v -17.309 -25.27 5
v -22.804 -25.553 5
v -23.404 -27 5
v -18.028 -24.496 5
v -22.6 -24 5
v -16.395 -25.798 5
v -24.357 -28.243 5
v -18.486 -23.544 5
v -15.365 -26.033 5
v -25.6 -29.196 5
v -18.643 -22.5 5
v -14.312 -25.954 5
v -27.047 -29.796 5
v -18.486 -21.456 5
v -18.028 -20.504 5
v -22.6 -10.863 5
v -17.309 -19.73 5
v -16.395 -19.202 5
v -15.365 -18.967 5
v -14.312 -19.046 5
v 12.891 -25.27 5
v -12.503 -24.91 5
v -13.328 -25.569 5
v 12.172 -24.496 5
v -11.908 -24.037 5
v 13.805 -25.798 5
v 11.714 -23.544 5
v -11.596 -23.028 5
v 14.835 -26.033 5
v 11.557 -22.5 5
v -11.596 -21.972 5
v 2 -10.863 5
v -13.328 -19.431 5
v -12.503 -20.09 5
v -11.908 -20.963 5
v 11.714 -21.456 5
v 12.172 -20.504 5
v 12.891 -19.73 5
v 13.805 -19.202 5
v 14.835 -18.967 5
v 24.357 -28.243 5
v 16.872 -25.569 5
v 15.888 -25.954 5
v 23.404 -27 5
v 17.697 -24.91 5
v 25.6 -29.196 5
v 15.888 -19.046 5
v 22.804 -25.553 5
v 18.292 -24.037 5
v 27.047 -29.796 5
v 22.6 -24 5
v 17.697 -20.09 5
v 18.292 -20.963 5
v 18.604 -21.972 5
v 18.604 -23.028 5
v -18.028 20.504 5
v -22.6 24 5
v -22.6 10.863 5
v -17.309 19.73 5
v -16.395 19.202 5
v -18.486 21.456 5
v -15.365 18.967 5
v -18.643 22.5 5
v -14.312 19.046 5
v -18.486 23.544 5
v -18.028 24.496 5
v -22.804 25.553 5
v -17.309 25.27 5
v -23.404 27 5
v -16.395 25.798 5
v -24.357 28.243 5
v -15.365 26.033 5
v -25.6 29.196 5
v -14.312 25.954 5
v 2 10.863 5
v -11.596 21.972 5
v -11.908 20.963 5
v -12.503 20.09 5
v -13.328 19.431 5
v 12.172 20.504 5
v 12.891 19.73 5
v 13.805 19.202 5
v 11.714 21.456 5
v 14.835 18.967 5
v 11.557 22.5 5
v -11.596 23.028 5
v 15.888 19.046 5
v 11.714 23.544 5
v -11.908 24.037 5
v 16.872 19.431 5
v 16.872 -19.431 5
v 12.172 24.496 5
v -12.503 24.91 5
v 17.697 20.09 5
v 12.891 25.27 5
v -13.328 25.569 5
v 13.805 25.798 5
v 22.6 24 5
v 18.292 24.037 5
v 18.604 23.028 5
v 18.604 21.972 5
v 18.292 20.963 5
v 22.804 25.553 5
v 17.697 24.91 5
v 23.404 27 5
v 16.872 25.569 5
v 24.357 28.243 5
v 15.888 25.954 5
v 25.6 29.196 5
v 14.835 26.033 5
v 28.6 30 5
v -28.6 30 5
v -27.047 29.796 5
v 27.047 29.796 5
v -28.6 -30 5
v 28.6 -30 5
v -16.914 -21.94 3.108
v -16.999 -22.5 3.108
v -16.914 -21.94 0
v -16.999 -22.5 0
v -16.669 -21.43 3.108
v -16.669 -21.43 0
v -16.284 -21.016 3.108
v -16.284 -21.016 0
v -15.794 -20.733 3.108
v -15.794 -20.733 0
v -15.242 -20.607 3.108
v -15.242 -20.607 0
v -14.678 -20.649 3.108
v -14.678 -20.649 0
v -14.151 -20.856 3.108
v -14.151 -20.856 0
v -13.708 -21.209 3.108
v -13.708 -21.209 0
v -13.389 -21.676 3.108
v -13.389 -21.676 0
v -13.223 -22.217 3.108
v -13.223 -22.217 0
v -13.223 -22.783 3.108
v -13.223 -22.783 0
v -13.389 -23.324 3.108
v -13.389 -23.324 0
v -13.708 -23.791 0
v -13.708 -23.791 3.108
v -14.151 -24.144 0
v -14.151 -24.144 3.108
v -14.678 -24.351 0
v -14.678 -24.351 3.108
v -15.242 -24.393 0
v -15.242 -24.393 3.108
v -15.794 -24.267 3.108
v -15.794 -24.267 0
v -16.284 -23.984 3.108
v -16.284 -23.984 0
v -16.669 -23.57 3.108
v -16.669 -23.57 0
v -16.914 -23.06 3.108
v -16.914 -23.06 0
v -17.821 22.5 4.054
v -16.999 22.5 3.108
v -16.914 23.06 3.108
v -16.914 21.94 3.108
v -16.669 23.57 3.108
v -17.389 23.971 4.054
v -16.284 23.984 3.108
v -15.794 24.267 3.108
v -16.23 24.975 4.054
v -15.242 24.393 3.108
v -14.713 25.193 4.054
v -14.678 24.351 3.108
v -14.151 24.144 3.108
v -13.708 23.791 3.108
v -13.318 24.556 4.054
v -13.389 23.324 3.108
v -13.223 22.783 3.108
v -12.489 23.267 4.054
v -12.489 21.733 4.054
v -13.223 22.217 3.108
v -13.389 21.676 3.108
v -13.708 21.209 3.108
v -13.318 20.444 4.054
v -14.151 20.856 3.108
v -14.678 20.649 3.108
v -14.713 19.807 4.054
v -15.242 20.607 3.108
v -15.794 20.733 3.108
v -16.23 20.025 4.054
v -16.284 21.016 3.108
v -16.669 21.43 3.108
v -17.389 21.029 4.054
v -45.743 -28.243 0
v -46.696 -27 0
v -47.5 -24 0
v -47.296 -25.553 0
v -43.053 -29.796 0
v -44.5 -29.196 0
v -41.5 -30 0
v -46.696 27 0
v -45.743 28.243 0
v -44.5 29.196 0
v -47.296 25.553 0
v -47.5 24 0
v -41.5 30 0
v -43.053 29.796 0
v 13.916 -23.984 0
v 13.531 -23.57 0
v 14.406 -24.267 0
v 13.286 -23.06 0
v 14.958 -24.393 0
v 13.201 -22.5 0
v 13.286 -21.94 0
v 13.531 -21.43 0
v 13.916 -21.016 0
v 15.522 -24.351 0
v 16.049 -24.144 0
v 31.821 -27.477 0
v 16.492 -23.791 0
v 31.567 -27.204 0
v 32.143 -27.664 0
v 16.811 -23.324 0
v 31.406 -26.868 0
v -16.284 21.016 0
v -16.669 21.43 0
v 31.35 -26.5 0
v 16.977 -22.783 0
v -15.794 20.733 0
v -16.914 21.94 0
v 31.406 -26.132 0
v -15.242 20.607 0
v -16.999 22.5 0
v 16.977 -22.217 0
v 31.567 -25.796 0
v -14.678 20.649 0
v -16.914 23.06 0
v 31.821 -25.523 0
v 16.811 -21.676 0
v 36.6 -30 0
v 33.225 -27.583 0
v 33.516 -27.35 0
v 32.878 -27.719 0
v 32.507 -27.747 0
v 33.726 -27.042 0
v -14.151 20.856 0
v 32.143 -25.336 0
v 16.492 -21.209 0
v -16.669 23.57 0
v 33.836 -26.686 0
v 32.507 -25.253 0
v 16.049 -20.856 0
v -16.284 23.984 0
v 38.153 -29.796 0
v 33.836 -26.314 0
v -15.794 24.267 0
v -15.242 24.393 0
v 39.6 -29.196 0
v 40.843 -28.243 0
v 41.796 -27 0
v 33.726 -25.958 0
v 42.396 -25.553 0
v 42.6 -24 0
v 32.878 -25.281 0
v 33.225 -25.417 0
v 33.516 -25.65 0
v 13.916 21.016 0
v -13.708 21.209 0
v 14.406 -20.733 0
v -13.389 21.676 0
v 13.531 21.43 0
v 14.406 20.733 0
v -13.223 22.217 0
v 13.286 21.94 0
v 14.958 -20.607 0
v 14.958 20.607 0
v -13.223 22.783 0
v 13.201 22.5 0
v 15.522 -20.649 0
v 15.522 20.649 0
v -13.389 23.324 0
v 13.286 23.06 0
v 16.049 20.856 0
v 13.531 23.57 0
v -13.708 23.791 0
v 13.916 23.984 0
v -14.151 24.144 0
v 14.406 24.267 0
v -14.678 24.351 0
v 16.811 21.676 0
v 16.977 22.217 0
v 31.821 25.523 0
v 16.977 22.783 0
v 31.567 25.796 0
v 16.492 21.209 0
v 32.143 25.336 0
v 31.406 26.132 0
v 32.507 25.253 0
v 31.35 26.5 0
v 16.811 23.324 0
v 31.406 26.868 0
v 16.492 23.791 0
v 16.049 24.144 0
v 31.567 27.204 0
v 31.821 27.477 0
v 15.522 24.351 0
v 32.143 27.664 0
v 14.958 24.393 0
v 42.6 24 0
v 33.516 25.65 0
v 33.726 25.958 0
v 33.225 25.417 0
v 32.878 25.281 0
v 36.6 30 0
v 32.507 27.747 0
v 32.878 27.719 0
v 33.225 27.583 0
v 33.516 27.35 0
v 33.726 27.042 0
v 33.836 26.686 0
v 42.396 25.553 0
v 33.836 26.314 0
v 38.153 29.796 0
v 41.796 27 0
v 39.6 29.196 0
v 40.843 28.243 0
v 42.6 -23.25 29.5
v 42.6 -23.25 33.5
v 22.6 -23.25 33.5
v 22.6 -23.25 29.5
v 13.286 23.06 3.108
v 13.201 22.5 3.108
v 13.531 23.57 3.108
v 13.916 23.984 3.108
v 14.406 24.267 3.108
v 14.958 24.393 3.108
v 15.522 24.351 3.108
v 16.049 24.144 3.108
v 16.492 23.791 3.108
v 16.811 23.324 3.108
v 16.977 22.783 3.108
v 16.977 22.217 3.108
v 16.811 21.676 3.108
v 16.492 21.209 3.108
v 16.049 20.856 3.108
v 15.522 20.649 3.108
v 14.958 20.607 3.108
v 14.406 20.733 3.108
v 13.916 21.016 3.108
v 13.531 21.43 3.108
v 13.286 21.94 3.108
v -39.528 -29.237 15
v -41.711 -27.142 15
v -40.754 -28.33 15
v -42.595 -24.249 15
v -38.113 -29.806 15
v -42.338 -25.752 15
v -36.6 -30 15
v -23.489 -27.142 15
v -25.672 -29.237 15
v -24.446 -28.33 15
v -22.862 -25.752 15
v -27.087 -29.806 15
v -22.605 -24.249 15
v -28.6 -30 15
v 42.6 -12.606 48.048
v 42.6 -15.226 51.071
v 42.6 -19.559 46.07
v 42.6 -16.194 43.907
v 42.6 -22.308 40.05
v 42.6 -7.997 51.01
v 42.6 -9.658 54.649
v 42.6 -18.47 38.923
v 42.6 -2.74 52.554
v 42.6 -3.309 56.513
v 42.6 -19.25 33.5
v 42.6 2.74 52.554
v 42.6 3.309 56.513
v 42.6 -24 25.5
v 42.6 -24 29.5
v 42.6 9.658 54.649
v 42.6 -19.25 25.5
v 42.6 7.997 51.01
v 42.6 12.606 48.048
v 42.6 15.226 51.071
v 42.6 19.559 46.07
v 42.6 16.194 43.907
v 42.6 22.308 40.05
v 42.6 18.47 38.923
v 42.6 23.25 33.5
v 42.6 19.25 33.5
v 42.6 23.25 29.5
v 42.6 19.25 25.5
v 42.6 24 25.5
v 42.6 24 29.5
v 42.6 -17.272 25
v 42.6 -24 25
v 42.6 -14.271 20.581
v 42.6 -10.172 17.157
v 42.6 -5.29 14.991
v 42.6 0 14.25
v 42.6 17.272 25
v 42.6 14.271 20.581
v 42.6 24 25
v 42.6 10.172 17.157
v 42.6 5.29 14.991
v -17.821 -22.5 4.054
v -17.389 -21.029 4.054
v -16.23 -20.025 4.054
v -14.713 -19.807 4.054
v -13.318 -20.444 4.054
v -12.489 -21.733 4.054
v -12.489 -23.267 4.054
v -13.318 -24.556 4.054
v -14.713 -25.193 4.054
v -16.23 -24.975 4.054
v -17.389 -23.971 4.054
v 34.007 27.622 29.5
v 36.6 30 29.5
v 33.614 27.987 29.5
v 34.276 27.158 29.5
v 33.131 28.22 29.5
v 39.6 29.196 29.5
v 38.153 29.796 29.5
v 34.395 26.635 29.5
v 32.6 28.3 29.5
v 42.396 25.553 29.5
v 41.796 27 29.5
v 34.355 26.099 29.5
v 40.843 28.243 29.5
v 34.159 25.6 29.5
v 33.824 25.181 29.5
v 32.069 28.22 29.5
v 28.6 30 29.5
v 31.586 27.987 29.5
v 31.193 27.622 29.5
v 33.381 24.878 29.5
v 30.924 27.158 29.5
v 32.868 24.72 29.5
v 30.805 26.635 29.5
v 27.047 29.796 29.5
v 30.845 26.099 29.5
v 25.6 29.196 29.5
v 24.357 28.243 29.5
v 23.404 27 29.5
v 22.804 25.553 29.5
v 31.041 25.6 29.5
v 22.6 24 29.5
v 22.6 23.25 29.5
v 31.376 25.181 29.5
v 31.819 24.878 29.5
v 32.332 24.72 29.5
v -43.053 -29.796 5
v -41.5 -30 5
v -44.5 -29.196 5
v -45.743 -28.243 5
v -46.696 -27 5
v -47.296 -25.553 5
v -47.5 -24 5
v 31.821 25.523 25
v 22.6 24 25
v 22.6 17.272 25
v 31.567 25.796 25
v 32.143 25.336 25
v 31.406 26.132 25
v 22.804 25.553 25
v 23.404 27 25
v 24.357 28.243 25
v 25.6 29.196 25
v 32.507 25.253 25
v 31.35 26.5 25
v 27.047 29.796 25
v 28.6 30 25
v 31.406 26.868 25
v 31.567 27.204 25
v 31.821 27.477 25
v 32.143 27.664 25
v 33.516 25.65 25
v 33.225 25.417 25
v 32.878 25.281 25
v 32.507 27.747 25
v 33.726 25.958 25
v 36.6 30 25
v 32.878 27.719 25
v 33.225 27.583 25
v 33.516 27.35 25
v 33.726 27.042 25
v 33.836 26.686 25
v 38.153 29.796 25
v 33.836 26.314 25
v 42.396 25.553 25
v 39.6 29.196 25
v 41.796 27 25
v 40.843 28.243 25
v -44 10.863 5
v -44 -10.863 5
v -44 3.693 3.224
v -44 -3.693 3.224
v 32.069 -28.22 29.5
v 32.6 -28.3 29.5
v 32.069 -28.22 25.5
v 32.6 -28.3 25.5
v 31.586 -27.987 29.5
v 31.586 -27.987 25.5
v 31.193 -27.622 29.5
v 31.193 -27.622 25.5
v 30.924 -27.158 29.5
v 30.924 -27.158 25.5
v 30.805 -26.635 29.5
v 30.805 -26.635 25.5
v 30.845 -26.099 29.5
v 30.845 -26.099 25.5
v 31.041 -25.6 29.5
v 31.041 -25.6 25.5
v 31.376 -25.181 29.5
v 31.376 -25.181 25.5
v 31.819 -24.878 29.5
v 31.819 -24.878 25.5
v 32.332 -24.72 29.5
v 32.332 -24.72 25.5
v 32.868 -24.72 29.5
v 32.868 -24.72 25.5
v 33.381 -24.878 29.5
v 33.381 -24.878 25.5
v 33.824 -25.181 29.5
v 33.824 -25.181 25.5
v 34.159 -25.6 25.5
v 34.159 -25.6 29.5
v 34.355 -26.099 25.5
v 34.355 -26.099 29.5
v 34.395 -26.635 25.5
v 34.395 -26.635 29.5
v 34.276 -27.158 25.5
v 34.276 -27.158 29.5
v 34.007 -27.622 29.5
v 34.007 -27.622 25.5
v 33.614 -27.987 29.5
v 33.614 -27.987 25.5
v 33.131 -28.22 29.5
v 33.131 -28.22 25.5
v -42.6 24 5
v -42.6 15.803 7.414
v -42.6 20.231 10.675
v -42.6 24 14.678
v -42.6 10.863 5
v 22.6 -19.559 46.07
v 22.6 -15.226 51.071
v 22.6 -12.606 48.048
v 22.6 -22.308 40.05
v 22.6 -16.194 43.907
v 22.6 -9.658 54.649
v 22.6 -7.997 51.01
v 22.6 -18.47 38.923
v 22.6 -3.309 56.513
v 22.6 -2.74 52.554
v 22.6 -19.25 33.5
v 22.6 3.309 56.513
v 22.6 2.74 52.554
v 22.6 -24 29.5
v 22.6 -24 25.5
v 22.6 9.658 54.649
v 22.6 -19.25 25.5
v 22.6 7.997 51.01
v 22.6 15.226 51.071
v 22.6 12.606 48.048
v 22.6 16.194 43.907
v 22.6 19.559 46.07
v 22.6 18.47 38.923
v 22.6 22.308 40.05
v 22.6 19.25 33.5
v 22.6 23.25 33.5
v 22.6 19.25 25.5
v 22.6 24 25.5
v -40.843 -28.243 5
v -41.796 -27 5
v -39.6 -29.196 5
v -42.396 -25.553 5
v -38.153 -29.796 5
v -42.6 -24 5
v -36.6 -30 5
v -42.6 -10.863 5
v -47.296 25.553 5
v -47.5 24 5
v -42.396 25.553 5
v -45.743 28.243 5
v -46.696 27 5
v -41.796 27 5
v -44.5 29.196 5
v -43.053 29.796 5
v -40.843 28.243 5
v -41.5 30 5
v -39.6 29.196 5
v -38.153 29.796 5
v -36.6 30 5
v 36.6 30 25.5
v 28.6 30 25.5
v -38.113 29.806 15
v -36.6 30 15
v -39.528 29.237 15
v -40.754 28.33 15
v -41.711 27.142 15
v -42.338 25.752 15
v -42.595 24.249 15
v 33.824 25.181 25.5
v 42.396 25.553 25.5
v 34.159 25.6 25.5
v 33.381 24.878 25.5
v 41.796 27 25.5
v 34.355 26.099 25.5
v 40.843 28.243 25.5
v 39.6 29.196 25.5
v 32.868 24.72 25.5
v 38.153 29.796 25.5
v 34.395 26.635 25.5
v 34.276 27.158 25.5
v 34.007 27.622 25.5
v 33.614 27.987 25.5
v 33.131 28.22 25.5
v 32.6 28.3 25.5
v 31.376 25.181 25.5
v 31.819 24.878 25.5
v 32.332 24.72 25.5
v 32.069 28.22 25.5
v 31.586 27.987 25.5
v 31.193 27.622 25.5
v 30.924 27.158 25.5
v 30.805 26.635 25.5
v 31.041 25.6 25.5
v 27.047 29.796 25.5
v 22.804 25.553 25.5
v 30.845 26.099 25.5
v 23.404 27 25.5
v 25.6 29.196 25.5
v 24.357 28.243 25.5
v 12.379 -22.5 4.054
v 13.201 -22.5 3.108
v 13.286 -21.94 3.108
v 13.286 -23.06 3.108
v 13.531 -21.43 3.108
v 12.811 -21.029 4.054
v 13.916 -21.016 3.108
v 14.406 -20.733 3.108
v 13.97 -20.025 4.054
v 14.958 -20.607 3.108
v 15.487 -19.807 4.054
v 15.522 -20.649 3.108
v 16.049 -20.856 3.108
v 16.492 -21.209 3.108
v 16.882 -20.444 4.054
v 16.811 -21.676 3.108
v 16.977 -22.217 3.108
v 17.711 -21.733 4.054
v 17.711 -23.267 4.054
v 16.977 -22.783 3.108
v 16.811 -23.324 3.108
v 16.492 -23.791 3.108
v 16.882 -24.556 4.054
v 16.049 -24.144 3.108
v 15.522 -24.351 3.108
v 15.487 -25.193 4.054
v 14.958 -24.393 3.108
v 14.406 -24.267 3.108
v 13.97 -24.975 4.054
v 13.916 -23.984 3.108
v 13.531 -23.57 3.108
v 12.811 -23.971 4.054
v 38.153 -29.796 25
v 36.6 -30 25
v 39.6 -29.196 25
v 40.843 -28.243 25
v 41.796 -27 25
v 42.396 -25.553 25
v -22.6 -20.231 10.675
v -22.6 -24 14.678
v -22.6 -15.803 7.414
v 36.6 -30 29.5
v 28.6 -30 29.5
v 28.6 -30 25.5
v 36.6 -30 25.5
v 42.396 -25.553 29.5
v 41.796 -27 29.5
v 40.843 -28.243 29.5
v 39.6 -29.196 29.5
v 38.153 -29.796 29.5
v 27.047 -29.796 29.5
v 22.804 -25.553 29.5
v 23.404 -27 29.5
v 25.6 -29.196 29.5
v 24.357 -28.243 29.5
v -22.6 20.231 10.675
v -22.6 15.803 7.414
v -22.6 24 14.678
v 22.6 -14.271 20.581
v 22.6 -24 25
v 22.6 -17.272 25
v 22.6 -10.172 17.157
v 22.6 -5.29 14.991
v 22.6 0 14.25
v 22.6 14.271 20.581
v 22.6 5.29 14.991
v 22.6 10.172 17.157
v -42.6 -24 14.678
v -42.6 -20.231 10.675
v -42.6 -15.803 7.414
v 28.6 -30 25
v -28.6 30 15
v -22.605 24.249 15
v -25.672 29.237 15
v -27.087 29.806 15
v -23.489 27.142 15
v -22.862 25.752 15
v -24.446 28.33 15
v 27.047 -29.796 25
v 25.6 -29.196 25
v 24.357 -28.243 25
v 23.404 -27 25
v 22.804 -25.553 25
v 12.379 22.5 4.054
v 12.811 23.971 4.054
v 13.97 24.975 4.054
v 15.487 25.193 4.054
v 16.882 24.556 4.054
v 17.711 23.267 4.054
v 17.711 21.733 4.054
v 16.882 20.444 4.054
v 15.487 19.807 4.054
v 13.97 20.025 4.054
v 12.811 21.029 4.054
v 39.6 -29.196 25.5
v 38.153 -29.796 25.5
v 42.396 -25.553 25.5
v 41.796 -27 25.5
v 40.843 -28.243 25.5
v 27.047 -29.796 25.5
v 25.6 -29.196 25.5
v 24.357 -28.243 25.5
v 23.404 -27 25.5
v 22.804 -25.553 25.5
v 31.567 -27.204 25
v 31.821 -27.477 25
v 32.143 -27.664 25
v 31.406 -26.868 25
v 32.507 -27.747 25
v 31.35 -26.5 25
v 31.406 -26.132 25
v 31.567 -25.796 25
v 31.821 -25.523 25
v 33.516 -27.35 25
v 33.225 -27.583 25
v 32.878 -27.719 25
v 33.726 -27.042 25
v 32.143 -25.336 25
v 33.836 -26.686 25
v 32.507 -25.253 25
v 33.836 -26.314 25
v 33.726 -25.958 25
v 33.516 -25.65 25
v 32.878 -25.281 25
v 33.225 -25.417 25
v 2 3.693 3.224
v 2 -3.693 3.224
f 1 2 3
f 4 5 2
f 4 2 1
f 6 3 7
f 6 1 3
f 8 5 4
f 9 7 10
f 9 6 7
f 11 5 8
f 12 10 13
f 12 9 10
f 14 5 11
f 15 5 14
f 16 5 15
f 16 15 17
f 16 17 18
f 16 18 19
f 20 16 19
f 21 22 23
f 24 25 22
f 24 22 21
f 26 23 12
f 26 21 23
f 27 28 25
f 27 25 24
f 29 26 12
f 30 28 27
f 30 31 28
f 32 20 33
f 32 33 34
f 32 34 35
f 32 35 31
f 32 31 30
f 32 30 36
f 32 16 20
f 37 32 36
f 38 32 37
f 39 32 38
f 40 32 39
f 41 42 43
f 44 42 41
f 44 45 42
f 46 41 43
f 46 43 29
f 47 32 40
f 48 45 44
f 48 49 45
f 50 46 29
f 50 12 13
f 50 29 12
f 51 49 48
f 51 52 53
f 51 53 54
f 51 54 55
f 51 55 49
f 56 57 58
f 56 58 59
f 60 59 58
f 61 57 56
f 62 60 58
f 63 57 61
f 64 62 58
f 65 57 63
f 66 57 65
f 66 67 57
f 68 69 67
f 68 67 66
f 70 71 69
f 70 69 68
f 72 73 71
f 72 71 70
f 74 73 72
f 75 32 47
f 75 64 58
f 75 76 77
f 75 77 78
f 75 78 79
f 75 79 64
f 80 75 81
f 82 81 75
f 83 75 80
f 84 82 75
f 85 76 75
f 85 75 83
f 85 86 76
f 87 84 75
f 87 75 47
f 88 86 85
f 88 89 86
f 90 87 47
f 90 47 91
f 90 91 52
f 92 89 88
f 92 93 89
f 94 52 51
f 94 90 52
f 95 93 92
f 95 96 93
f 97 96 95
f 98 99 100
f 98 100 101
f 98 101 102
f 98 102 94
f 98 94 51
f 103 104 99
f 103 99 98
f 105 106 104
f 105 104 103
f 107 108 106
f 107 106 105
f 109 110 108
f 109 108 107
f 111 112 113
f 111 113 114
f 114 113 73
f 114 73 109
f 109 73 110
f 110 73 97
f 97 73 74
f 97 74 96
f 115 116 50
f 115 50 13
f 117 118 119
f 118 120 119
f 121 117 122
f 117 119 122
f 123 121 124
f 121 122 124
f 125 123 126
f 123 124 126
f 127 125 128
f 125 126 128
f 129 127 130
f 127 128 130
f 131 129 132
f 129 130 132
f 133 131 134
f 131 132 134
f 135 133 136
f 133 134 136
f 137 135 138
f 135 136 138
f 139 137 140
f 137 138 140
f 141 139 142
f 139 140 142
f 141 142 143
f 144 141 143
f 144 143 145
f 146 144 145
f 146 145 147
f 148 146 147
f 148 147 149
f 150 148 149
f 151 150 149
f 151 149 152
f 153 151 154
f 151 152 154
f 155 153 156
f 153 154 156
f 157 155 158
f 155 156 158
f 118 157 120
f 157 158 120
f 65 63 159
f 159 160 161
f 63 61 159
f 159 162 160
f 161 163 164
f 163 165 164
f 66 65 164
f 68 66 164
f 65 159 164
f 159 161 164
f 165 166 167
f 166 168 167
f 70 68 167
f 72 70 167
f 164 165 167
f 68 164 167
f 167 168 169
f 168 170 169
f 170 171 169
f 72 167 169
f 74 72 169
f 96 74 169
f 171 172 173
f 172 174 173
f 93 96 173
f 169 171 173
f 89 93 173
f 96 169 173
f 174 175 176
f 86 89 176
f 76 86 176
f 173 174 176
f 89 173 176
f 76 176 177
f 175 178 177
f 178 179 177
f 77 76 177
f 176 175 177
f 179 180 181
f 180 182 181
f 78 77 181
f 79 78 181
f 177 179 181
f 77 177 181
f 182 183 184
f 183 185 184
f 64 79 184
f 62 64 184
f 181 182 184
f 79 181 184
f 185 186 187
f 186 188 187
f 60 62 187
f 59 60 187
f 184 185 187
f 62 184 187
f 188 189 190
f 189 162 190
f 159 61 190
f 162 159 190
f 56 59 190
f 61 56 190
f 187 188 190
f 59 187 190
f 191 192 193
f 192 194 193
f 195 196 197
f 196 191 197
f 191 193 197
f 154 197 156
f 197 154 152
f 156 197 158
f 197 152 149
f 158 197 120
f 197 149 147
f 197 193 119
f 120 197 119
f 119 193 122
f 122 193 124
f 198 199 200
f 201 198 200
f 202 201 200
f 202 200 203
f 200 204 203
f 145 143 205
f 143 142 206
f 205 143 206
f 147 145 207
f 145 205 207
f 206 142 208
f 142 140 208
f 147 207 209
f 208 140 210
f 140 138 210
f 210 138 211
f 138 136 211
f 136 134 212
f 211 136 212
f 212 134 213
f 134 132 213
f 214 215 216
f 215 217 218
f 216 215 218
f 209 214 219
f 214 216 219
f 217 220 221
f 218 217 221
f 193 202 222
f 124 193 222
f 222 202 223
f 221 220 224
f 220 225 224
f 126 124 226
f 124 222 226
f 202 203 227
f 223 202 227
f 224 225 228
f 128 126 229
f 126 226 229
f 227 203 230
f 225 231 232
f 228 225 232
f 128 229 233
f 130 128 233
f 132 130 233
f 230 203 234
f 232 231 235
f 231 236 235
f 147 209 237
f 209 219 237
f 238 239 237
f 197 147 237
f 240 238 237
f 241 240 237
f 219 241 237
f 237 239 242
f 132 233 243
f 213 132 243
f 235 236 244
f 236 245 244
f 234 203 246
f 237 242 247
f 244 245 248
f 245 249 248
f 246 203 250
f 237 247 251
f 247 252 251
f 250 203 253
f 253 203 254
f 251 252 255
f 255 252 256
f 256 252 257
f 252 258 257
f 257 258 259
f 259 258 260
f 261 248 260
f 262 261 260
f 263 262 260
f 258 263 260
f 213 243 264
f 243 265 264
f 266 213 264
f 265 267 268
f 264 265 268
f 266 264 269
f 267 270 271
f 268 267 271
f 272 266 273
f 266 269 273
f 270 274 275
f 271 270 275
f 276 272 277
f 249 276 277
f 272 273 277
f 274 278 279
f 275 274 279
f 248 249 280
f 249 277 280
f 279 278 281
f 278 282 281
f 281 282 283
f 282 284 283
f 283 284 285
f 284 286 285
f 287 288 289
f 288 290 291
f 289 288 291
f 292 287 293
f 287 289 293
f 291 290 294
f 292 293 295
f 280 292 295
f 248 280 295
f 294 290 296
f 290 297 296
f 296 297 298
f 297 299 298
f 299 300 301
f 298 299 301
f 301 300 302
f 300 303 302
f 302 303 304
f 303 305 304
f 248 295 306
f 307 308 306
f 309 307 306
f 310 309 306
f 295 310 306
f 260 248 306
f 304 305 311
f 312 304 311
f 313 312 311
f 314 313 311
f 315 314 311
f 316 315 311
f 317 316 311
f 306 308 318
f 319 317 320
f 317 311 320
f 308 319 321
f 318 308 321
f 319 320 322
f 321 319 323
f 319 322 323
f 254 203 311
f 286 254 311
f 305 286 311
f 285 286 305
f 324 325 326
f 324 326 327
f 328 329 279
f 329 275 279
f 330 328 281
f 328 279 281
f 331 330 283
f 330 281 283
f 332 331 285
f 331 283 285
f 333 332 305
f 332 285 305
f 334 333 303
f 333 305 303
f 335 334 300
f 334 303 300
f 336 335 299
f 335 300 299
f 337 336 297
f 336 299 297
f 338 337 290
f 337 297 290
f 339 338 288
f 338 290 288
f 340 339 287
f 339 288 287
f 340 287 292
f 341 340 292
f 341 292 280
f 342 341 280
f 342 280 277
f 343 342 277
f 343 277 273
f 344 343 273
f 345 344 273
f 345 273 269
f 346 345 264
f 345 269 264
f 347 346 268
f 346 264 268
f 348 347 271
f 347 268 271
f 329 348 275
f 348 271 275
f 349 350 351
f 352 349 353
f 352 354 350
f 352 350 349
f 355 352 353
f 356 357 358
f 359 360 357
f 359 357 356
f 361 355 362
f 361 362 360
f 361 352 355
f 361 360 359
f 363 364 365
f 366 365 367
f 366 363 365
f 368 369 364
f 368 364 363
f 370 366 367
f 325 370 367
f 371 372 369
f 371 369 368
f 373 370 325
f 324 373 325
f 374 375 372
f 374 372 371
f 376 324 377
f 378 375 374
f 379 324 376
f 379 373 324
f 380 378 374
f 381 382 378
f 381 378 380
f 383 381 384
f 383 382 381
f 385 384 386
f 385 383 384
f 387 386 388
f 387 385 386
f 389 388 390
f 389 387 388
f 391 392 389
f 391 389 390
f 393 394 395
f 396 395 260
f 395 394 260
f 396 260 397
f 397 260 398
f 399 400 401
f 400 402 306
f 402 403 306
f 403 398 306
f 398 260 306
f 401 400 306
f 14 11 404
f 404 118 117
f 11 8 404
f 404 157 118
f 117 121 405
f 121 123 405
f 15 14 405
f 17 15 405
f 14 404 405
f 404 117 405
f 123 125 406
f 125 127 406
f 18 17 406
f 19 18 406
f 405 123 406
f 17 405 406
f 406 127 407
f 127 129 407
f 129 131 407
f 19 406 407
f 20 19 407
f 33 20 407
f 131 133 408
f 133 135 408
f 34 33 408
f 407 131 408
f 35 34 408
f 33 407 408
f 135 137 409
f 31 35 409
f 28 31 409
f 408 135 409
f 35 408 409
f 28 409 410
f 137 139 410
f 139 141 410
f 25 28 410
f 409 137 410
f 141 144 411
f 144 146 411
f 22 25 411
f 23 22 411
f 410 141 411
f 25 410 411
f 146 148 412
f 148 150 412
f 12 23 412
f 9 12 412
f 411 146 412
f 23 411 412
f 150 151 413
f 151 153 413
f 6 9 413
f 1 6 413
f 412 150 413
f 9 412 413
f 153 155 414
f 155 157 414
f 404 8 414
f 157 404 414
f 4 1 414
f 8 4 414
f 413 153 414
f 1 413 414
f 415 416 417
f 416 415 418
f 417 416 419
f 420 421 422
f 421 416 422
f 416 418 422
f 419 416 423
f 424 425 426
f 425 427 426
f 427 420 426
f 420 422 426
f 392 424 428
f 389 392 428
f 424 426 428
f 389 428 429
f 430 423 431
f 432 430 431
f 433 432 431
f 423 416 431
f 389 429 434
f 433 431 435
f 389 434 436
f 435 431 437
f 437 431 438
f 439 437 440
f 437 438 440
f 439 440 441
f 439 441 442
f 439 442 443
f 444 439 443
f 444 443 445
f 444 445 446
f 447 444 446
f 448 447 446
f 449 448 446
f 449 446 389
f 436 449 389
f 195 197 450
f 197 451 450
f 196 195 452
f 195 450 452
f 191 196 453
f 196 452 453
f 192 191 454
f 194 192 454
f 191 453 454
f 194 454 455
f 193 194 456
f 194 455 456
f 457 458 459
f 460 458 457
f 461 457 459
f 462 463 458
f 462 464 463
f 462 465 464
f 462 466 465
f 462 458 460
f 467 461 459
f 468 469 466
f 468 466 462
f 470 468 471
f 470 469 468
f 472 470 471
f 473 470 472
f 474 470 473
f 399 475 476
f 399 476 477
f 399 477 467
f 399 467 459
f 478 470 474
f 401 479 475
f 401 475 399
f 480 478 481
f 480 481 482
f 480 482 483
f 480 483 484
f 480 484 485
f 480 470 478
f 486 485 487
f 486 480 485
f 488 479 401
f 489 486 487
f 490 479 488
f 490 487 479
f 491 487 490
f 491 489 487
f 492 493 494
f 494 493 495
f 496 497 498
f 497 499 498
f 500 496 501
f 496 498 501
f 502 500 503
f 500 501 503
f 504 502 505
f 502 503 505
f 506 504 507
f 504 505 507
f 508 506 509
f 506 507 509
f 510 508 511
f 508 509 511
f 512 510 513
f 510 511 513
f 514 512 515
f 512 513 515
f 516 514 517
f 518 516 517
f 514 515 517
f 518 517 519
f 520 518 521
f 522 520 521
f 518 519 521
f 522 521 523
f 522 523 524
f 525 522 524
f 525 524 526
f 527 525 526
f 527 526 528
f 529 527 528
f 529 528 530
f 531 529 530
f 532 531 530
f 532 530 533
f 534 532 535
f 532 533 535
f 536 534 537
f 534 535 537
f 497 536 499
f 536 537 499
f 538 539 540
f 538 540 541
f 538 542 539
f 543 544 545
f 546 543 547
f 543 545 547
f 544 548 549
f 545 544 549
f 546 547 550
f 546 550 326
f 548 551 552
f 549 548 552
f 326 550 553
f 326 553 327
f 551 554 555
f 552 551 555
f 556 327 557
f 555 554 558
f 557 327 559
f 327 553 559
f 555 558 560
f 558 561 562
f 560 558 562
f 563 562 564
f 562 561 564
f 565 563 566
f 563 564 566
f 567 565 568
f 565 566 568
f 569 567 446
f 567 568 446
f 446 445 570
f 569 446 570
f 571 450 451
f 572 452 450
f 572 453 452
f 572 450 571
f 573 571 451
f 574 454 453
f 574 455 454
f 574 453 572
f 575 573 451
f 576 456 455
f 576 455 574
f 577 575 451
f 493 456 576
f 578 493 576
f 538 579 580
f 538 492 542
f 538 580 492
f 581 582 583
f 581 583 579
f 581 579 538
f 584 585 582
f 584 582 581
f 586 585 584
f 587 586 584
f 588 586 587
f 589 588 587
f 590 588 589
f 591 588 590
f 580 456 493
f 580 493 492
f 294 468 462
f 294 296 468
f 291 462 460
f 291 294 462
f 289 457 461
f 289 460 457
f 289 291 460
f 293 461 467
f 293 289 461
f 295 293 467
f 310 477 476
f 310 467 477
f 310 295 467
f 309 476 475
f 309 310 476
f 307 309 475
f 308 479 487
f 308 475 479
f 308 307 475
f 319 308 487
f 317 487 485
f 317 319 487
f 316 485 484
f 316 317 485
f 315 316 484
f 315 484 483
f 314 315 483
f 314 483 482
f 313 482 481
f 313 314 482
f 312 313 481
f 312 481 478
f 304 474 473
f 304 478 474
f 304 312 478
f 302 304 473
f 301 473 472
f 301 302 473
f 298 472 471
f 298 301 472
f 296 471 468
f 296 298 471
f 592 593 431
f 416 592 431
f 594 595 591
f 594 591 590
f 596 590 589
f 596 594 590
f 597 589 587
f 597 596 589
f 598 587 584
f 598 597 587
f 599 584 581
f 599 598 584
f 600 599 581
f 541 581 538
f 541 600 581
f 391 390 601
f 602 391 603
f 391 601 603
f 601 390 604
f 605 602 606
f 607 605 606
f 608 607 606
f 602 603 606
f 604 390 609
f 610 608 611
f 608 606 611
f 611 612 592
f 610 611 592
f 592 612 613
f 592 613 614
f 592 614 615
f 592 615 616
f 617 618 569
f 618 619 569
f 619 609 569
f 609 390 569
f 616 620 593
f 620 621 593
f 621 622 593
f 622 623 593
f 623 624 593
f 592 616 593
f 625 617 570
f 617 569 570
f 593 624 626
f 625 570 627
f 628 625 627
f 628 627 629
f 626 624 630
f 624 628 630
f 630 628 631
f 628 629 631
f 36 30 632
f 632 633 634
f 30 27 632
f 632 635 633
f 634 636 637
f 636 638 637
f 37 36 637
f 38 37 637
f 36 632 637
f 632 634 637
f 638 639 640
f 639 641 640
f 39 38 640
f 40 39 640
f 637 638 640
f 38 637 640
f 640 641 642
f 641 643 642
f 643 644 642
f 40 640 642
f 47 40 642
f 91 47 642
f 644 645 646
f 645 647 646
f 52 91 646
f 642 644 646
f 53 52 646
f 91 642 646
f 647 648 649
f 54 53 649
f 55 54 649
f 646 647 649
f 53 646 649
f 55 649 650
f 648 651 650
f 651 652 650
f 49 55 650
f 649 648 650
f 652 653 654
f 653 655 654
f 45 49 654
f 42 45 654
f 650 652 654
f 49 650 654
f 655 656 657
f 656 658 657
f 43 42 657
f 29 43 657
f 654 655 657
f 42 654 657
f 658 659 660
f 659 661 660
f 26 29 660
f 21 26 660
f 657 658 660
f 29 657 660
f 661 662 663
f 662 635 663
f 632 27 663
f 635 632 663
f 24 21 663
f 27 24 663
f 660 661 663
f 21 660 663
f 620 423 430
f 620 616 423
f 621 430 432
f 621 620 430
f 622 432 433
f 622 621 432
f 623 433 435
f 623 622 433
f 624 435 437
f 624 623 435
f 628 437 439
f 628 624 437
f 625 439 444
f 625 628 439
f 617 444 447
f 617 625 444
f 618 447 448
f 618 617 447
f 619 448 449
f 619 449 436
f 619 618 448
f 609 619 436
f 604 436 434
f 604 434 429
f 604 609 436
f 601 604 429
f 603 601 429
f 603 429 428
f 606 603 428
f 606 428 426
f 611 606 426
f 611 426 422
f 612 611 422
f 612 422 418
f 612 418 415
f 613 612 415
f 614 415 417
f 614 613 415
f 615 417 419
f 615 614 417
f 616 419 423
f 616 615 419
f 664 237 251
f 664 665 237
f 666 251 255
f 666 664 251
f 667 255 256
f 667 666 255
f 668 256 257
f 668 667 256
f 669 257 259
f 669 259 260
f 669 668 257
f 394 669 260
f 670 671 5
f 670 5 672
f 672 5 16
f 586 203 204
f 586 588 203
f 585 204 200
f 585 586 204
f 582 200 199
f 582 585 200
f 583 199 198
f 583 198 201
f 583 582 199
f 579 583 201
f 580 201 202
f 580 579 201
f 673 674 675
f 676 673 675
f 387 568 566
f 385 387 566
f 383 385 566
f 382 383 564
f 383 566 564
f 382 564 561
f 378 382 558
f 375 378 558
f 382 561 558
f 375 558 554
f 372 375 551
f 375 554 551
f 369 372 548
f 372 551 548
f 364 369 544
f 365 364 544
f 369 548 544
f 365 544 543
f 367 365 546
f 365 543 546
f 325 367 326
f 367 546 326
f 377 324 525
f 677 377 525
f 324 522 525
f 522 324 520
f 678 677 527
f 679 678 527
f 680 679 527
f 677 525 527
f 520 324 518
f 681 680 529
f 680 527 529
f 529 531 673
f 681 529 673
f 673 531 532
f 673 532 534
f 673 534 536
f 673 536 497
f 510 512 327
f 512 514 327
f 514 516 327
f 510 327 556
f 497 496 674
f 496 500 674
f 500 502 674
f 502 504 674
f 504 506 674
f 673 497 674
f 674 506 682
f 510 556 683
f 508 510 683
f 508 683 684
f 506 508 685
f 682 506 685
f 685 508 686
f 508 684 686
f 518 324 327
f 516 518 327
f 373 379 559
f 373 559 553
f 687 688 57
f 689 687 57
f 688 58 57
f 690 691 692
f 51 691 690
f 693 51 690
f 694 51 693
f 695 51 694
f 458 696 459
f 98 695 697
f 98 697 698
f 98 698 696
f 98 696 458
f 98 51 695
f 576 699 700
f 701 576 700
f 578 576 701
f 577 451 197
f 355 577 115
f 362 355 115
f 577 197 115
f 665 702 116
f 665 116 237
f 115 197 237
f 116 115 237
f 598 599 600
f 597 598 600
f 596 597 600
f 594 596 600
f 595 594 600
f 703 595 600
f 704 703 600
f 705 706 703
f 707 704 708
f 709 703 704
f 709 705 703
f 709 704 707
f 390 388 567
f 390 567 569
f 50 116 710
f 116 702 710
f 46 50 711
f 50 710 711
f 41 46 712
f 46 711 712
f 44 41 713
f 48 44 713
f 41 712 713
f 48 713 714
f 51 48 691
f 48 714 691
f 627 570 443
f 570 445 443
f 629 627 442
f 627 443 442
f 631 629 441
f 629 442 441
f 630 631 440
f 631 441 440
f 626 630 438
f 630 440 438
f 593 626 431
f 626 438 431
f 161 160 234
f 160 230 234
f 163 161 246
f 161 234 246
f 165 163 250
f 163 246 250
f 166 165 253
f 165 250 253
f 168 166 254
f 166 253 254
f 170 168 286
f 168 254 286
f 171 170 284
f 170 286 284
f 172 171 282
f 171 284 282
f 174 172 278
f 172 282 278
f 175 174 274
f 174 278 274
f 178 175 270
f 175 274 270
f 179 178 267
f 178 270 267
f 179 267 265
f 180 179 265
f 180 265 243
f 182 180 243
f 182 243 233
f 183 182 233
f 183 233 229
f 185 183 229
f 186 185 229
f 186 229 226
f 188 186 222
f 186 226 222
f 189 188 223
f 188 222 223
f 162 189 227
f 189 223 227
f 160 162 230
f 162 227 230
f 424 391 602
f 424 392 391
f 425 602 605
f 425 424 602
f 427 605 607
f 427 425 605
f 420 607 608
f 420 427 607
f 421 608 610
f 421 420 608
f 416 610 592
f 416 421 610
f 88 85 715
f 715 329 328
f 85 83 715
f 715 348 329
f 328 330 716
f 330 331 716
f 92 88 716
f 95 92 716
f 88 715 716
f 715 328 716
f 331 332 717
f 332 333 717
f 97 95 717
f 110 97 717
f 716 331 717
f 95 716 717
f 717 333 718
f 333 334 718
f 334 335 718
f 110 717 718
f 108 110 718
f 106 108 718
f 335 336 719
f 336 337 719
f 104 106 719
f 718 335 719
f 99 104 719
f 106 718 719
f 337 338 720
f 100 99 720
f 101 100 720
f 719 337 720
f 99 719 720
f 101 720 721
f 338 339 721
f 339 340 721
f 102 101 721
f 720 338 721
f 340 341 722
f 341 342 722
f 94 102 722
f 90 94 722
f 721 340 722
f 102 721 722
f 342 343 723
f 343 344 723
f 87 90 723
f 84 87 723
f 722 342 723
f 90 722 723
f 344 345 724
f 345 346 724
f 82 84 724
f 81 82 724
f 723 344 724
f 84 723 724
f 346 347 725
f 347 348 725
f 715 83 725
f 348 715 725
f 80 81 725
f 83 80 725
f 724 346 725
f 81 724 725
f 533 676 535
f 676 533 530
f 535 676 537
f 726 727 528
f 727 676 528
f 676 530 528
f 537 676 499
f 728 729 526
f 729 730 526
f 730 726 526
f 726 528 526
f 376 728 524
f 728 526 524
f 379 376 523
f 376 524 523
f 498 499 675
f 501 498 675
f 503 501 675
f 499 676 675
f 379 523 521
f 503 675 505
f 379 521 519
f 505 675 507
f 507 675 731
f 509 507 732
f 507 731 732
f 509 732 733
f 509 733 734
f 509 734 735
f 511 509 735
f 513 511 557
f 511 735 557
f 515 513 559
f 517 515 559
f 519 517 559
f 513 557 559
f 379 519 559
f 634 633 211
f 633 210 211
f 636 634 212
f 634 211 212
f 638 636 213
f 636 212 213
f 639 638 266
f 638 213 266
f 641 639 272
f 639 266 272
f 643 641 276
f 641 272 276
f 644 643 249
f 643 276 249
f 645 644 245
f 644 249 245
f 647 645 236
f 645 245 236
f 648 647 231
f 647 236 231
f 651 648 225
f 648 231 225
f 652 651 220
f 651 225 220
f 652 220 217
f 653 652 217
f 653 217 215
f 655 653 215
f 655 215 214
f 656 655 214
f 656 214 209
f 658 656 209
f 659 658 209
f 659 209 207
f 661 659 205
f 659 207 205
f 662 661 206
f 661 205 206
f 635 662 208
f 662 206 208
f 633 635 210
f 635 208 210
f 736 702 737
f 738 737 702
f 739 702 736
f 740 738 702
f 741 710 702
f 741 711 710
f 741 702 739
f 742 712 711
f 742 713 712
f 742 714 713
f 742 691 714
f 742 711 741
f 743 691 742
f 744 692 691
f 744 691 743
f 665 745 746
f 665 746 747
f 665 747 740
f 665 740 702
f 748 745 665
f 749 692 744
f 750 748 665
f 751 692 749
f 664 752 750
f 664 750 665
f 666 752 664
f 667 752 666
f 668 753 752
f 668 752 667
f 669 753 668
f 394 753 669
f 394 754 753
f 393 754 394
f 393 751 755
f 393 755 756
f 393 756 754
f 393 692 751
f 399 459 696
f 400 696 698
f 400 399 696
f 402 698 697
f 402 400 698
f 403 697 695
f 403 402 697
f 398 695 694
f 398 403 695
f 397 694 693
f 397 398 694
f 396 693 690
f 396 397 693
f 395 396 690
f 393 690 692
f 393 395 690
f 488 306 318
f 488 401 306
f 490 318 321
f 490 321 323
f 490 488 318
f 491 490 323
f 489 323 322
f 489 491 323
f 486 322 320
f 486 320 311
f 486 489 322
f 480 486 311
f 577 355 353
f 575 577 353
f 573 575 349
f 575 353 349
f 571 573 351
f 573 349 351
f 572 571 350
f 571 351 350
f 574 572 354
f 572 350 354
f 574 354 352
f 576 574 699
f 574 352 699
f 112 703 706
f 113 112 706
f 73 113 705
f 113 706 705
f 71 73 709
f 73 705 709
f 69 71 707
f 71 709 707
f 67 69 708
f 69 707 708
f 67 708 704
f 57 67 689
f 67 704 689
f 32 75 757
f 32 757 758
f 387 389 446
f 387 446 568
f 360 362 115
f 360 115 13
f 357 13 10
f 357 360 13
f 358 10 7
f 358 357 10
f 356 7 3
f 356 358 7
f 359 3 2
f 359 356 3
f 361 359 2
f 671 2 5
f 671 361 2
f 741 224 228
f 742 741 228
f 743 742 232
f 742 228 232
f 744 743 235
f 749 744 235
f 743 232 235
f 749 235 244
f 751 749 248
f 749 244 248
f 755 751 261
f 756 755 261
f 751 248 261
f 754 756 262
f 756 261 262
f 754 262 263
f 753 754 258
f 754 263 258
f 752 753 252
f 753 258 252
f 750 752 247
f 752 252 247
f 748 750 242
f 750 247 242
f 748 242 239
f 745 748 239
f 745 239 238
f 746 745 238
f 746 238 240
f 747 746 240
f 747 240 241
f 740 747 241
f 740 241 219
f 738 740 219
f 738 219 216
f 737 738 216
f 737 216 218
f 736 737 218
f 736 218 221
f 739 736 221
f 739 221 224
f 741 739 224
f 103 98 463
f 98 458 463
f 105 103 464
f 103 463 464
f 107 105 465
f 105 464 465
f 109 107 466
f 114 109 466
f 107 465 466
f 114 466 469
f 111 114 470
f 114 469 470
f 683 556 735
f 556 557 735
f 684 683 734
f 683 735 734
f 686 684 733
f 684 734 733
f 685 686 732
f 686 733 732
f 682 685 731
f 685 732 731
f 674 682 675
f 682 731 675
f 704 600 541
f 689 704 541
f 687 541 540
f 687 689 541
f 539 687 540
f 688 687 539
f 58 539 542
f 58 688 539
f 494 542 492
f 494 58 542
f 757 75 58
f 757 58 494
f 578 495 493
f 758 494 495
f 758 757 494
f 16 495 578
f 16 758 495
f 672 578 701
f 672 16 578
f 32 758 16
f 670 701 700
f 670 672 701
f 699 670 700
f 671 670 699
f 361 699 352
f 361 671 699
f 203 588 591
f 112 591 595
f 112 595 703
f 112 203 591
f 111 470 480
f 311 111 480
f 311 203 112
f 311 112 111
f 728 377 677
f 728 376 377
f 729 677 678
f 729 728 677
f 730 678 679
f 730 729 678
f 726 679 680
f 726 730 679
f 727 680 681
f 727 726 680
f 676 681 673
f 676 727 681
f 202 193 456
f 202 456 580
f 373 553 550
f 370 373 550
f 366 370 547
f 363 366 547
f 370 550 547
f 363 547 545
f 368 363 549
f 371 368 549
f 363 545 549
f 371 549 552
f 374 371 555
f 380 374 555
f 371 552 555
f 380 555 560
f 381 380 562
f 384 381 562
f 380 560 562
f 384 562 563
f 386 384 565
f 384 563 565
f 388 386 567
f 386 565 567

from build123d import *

# Parameters (mm, degrees)
BASE_SKETCH_W                   = 90
BASE_SKETCH_H                   = 60
BASE_EXTRUDE_DEPTH              = 5
CRADLE_SKETCH_W                 = 20
CRADLE_SKETCH_H                 = 60
CRADLE_EXTRUDE_DEPTH            = 25
NO_6_MOUNTING_HOLES_D           = 3.7973
NO_6_MOUNTING_HOLES_CSINK_D     = 7.0866
NO_6_MOUNTING_HOLES_CSINK_ANGLE = 82
MOVE_START                      = 15
MOVE_FACE_OUTLINE_W             = 20
MOVE_FACE_OUTLINE_H             = 60
MOVE_FACE_DEPTH                 = 10
CLAMP_THREADED_HOLE_D           = 2.5
CRADLE_FILLETS_R                = 6
BASE_FILLETS_R                  = 6
MOTOR_START                     = 22.6
MOTOR_CLAMP_EXTRUDE_DEPTH       = 20
SKETCH9_W                       = 1.8
SKETCH9_H                       = 4
CLAMP_CORNER_FILLETS_R          = 6


# Read off the part's stored shape, not the designer's step: Move Face
with BuildPart() as part:
    # Base Sketch → Base Extrude (new body)
    with BuildSketch(Plane.XY):
        with Locations((-2.5, 0)):
            Rectangle(BASE_SKETCH_W, BASE_SKETCH_H)
    extrude(amount=BASE_EXTRUDE_DEPTH)

    # Cradle Sketch → Cradle Extrude (add)
    with BuildSketch(Plane.XY):
        with Locations((-32.6, 0)):
            Rectangle(CRADLE_SKETCH_W, CRADLE_SKETCH_H)
        with Locations((32.6, 0)):
            Rectangle(CRADLE_SKETCH_W, CRADLE_SKETCH_H)
    extrude(amount=CRADLE_EXTRUDE_DEPTH)

    # No. 6 Mounting Holes (through all)
    with Locations(Plane.XY.offset(5)):
        with Locations((-15.1, 22.5), (15.1, 22.5), (-15.1, -22.5), (15.1, -22.5)):
            CounterSinkHole(NO_6_MOUNTING_HOLES_D / 2, NO_6_MOUNTING_HOLES_CSINK_D / 2, counter_sink_angle=NO_6_MOUNTING_HOLES_CSINK_ANGLE)

    # Pump and Motor Revolve Cut Sketch → Pump and Motor Revolve Cut (revolve, cut)
    with BuildSketch(Plane(origin=(0, 0, 0), x_dir=(1, 0, 0), z_dir=(0, 1, 0))):
        Polygon((-44, -33.5), (-44, -3), (2, -3), (2, -14.25), (66, -14.25), (66, -33.5), align=None)
    revolve(axis=Axis((66, 0, 33.5), (-1, 0, 0)), mode=Mode.SUBTRACT)

    # Move Face outline → Move Face (cut)
    with BuildSketch(Plane.XY.offset(MOVE_START)):
        with Locations((-32.6, 0)):
            Rectangle(MOVE_FACE_OUTLINE_W, MOVE_FACE_OUTLINE_H)
    extrude(amount=MOVE_FACE_DEPTH, mode=Mode.SUBTRACT)

    # Clamp Threaded Hole (through all)
    with Locations(Plane.XY.offset(25)):
        with Locations((32.6, -26.5)):
            clamp_threaded_hole = Hole(CLAMP_THREADED_HOLE_D / 2)

    # Cradle Fillets
    cradle_fillets_edges = [part.edges().sort_by_distance(p)[0] for p in [
        (-42.6, 30, 10),
        (42.6, 30, 12.5),
        (42.6, -30, 12.5),
        (-42.6, -30, 10),
        (22.6, 30, 15),
        (22.6, -30, 15),
        (-22.6, 30, 10),
        (-22.6, -30, 10),
    ]]
    fillet(cradle_fillets_edges, radius=CRADLE_FILLETS_R)

    # Base Fillets
    base_fillets_edges = [part.edges().sort_by_distance(p)[0] for p in [
        (-47.5, -30, 2.5),
        (-47.5, 30, 2.5),
    ]]
    fillet(base_fillets_edges, radius=BASE_FILLETS_R)


with BuildPart() as body_2:
    # Hold Down Bracket Sketch → Motor Clamp Extrude (new body)
    with BuildSketch(Plane(origin=(0, 0, 0), x_dir=(0, 0, -1), z_dir=(1, 0, 0)).offset(MOTOR_START)):
        with BuildLine():
            Line((-33.5, -23.25), (-29.5, -23.25))
            Line((-29.5, -23.25), (-29.5, -30))
            Line((-29.5, -30), (-25.5, -30))
            Line((-25.5, -30), (-25.5, -19.25))
            Line((-25.5, -19.25), (-33.5, -19.25))
            ThreePointArc((-33.5, -19.25), (-52.75, 0), (-33.5, 19.25))
            Line((-33.5, 19.25), (-25.5, 19.25))
            Line((-25.5, 19.25), (-25.5, 30))
            Line((-25.5, 30), (-29.5, 30))
            Line((-29.5, 30), (-29.5, 23.25))
            Line((-29.5, 23.25), (-33.5, 23.25))
            ThreePointArc((-33.5, 23.25), (-56.75, 0), (-33.5, -23.25))
        make_face()
    extrude(amount=MOTOR_CLAMP_EXTRUDE_DEPTH)

    # Sketch9 → Clamp Clearance Hole (revolve, cut)
    with BuildSketch(Plane(origin=(32.6, -26.5, 29.5), x_dir=(0, -1, 0), z_dir=(1, 0, 0))):
        with Locations((0.9, 2)):
            Rectangle(SKETCH9_W, SKETCH9_H)
    clamp_clearance_hole = revolve(axis=Axis((32.6, -26.5, 35.85), (0, 0, -1)), mode=Mode.SUBTRACT)


with BuildPart() as motor_clamp_screw_holes_mirror_tool:
    # Motor Clamp Screw Holes Mirror: Clamp Threaded Hole, Clamp Clearance Hole across plane
    add(clamp_threaded_hole.mirror(Plane.ZX))
    add(clamp_clearance_hole.mirror(Plane.ZX))


with BuildPart() as part_1:
    add(part.part)

    # Motor Clamp Screw Holes Mirror: cut by motor_clamp_screw_holes_mirror_tool
    add(motor_clamp_screw_holes_mirror_tool.part, mode=Mode.SUBTRACT)


with BuildPart() as body_2_1:
    add(body_2.part)

    # Motor Clamp Screw Holes Mirror: cut by motor_clamp_screw_holes_mirror_tool
    add(motor_clamp_screw_holes_mirror_tool.part, mode=Mode.SUBTRACT)

    # Clamp Corner Fillets
    clamp_corner_fillets_edges = [body_2_1.edges().sort_by_distance(p)[0] for p in [
        (22.6, -30, 27.5),
        (22.6, 30, 27.5),
        (42.6, -30, 27.5),
        (42.6, 30, 27.5),
    ]]
    fillet(clamp_corner_fillets_edges, radius=CLAMP_CORNER_FILLETS_R)


solid = Compound([part_1.part, body_2_1.part])
